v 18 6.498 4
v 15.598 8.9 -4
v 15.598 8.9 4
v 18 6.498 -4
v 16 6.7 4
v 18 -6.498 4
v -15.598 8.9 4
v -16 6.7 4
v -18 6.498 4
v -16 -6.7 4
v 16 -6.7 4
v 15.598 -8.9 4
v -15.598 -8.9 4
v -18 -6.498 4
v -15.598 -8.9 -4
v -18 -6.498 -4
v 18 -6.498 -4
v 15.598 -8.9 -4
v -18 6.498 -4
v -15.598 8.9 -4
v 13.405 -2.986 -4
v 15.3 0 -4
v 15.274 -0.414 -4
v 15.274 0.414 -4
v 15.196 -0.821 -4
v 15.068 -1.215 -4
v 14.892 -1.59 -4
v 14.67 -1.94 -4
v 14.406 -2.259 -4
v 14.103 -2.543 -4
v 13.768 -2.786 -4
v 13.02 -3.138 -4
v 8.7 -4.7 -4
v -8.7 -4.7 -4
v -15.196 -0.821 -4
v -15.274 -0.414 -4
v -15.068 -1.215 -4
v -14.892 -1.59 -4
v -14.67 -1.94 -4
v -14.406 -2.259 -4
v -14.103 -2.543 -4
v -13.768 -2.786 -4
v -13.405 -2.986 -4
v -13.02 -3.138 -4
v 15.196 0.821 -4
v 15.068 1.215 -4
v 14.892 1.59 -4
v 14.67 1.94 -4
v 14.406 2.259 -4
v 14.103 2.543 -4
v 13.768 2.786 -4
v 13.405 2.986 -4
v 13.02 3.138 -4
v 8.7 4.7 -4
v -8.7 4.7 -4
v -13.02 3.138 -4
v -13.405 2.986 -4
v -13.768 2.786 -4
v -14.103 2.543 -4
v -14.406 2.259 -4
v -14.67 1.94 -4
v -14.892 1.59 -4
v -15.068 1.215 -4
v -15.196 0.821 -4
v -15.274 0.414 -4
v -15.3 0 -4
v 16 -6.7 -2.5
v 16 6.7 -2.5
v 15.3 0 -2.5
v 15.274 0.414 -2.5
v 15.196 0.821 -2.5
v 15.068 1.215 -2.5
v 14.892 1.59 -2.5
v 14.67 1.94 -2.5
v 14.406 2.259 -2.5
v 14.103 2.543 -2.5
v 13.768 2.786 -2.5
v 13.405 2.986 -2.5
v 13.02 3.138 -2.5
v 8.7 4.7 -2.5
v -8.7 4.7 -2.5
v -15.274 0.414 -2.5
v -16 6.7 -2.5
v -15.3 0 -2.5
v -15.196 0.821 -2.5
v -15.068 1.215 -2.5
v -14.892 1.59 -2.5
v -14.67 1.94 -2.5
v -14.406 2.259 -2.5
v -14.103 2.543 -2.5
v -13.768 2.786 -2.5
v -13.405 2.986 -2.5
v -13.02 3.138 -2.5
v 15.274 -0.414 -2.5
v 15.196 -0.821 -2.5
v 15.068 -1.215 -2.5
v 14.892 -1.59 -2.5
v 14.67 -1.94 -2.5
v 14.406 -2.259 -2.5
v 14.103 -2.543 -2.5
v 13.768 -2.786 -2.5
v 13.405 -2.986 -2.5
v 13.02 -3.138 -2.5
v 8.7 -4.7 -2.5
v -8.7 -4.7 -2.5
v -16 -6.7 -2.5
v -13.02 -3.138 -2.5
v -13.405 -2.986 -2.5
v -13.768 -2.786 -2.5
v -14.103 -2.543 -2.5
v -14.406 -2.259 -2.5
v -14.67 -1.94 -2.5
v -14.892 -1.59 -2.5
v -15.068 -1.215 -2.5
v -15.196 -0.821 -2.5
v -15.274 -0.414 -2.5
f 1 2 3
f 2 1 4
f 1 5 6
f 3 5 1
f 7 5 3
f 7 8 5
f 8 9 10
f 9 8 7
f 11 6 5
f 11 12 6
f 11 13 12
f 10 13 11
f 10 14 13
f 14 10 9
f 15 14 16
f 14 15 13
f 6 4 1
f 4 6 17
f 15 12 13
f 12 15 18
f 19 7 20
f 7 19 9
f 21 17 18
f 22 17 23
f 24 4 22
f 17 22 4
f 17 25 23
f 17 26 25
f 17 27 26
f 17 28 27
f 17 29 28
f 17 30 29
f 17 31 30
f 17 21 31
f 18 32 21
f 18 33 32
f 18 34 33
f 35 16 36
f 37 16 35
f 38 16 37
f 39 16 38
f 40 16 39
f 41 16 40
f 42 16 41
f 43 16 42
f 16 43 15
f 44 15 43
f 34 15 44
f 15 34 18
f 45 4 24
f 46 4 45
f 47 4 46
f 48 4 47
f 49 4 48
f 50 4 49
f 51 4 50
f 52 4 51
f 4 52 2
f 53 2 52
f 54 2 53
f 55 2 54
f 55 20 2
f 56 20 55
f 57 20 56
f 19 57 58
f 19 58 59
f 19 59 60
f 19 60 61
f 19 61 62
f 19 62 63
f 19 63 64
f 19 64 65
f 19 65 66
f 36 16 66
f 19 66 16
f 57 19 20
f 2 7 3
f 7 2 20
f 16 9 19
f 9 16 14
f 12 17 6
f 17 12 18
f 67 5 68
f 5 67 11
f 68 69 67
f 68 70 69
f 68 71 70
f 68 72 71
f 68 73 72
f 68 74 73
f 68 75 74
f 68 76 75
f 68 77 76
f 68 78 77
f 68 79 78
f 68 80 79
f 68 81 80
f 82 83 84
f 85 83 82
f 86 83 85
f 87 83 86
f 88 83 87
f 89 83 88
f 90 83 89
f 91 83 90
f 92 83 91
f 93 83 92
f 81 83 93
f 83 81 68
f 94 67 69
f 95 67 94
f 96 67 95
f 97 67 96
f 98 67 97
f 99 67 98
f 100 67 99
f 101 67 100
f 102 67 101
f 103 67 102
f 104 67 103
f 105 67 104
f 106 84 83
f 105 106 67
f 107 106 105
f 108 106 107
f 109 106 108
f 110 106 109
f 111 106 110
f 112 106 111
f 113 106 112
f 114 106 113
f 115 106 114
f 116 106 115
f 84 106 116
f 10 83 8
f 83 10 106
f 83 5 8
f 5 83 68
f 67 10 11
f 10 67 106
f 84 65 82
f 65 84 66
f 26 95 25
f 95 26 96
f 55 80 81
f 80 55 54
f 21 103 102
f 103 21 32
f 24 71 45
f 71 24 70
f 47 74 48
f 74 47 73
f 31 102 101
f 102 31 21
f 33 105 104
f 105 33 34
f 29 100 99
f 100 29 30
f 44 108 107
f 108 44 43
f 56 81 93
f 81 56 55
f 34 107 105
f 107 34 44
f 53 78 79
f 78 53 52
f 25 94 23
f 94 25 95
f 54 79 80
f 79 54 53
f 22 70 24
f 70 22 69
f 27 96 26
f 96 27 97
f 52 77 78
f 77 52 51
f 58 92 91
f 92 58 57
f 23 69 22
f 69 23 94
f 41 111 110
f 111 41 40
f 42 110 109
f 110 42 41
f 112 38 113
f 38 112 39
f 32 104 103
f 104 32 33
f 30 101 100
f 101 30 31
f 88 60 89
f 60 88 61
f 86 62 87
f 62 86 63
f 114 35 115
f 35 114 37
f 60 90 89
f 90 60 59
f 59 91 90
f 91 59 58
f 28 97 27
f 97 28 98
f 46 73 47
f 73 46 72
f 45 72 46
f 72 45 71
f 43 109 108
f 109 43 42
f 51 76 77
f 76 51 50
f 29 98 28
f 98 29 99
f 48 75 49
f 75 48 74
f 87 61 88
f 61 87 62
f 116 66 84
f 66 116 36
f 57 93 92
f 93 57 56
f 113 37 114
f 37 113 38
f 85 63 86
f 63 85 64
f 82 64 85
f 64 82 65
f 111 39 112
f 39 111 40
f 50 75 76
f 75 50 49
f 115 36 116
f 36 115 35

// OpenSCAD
bezelDepth=15;
holeX = 31.5;
holeY = 25.4+bezelDepth;
Threaded_insert_width=4.8;
Threaded_insert_height=5;
boltThreadD=3.8;
boltHeadD=Threaded_insert_width+2;

rise = 9;
run = 2;
riseOverRun = rise/run;

module threadedInsert() {
    cylinder(h=Threaded_insert_height, d=Threaded_insert_width, $fn=50);
}

module vgaCutout() {
    hull() {
        square([17.4,9.4], center=true);

        translate([24/2,0,0])       
            circle(d=6.6, $fn=50);

        translate([-24/2,0,0]) 
            circle(d=6.6, $fn=50);
    }
}

module vgaCutoutWithBackMount(adapterW=31.4, adapterH=13) {
    union() {
        vgaCutout();
        
        translate([(adapterW/2)-(Threaded_insert_width/2),(adapterH/2)+(Threaded_insert_width/2)+1.8])
            circle(d=boltThreadD, $fn=50);

        translate([((adapterW/2)-(Threaded_insert_width/2))*-1,(adapterH/2)+(Threaded_insert_width/2)+1.8])
            circle(d=boltThreadD, $fn=50);

        translate([(adapterW/2)-(Threaded_insert_width/2),((adapterH/2)+(Threaded_insert_width/2)+1.8)*-1])
            circle(d=boltThreadD, $fn=50);
        
        translate([((adapterW/2)-(Threaded_insert_width/2))*-1,((adapterH/2)+(Threaded_insert_width/2)+1.8)*-1])
            circle(d=boltThreadD, $fn=50);
    }
}

module vgaBackBracket(adapterW=32, adapterH=13.4, adapterD=6.6) {
    let(sideW = 0.2) {
        difference() {
            translate([0,0,-(adapterD+1.4)/2])
                linear_extrude(adapterD+1.4)
                    chamferRect(adapterW+4,adapterH+4+sideW*2, 4.1);
            
            translate([0,0,0.8])
                cube([adapterW,adapterH,adapterD], center=true);
            
            translate([0,0,-(adapterD+2)/2])
                linear_extrude(adapterD+2)
                    vgaCutout();
/*
            translate([(adapterW/2)-(Threaded_insert_width/2),(adapterH/2)+(Threaded_insert_width/2)+1.8,-1])
                threadedInsert();

            translate([((adapterW/2)-(Threaded_insert_width/2))*-1,(adapterH/2)+(Threaded_insert_width/2)+1.8,-1])
                threadedInsert();

            translate([(adapterW/2)-(Threaded_insert_width/2),((adapterH/2)+(Threaded_insert_width/2)+1.8)*-1,-1])
                threadedInsert();
            
            translate([((adapterW/2)-(Threaded_insert_width/2))*-1,((adapterH/2)+(Threaded_insert_width/2)+1.8)*-1,-1])
                threadedInsert();
                */
        }
    }    
}

module roundedRect(rectW, rectH, rectR) {
    hull() {
        translate([rectR, rectR])
            circle(r=rectR, $fn=50);

        translate([rectW-rectR, rectR])
            circle(r=rectR, $fn=50);

        translate([rectR, rectH-rectR])
            circle(r=rectR, $fn=50);

        translate([rectW-rectR, rectH-rectR])
            circle(r=rectR, $fn=50);
    }
}

module chamferRect(rectW, rectH, rectC) {
    offset(delta=rectC, chamfer=true)
        square([rectW-rectC*2, rectH-rectC*2], center=true);
}

vgaBackBracket();
